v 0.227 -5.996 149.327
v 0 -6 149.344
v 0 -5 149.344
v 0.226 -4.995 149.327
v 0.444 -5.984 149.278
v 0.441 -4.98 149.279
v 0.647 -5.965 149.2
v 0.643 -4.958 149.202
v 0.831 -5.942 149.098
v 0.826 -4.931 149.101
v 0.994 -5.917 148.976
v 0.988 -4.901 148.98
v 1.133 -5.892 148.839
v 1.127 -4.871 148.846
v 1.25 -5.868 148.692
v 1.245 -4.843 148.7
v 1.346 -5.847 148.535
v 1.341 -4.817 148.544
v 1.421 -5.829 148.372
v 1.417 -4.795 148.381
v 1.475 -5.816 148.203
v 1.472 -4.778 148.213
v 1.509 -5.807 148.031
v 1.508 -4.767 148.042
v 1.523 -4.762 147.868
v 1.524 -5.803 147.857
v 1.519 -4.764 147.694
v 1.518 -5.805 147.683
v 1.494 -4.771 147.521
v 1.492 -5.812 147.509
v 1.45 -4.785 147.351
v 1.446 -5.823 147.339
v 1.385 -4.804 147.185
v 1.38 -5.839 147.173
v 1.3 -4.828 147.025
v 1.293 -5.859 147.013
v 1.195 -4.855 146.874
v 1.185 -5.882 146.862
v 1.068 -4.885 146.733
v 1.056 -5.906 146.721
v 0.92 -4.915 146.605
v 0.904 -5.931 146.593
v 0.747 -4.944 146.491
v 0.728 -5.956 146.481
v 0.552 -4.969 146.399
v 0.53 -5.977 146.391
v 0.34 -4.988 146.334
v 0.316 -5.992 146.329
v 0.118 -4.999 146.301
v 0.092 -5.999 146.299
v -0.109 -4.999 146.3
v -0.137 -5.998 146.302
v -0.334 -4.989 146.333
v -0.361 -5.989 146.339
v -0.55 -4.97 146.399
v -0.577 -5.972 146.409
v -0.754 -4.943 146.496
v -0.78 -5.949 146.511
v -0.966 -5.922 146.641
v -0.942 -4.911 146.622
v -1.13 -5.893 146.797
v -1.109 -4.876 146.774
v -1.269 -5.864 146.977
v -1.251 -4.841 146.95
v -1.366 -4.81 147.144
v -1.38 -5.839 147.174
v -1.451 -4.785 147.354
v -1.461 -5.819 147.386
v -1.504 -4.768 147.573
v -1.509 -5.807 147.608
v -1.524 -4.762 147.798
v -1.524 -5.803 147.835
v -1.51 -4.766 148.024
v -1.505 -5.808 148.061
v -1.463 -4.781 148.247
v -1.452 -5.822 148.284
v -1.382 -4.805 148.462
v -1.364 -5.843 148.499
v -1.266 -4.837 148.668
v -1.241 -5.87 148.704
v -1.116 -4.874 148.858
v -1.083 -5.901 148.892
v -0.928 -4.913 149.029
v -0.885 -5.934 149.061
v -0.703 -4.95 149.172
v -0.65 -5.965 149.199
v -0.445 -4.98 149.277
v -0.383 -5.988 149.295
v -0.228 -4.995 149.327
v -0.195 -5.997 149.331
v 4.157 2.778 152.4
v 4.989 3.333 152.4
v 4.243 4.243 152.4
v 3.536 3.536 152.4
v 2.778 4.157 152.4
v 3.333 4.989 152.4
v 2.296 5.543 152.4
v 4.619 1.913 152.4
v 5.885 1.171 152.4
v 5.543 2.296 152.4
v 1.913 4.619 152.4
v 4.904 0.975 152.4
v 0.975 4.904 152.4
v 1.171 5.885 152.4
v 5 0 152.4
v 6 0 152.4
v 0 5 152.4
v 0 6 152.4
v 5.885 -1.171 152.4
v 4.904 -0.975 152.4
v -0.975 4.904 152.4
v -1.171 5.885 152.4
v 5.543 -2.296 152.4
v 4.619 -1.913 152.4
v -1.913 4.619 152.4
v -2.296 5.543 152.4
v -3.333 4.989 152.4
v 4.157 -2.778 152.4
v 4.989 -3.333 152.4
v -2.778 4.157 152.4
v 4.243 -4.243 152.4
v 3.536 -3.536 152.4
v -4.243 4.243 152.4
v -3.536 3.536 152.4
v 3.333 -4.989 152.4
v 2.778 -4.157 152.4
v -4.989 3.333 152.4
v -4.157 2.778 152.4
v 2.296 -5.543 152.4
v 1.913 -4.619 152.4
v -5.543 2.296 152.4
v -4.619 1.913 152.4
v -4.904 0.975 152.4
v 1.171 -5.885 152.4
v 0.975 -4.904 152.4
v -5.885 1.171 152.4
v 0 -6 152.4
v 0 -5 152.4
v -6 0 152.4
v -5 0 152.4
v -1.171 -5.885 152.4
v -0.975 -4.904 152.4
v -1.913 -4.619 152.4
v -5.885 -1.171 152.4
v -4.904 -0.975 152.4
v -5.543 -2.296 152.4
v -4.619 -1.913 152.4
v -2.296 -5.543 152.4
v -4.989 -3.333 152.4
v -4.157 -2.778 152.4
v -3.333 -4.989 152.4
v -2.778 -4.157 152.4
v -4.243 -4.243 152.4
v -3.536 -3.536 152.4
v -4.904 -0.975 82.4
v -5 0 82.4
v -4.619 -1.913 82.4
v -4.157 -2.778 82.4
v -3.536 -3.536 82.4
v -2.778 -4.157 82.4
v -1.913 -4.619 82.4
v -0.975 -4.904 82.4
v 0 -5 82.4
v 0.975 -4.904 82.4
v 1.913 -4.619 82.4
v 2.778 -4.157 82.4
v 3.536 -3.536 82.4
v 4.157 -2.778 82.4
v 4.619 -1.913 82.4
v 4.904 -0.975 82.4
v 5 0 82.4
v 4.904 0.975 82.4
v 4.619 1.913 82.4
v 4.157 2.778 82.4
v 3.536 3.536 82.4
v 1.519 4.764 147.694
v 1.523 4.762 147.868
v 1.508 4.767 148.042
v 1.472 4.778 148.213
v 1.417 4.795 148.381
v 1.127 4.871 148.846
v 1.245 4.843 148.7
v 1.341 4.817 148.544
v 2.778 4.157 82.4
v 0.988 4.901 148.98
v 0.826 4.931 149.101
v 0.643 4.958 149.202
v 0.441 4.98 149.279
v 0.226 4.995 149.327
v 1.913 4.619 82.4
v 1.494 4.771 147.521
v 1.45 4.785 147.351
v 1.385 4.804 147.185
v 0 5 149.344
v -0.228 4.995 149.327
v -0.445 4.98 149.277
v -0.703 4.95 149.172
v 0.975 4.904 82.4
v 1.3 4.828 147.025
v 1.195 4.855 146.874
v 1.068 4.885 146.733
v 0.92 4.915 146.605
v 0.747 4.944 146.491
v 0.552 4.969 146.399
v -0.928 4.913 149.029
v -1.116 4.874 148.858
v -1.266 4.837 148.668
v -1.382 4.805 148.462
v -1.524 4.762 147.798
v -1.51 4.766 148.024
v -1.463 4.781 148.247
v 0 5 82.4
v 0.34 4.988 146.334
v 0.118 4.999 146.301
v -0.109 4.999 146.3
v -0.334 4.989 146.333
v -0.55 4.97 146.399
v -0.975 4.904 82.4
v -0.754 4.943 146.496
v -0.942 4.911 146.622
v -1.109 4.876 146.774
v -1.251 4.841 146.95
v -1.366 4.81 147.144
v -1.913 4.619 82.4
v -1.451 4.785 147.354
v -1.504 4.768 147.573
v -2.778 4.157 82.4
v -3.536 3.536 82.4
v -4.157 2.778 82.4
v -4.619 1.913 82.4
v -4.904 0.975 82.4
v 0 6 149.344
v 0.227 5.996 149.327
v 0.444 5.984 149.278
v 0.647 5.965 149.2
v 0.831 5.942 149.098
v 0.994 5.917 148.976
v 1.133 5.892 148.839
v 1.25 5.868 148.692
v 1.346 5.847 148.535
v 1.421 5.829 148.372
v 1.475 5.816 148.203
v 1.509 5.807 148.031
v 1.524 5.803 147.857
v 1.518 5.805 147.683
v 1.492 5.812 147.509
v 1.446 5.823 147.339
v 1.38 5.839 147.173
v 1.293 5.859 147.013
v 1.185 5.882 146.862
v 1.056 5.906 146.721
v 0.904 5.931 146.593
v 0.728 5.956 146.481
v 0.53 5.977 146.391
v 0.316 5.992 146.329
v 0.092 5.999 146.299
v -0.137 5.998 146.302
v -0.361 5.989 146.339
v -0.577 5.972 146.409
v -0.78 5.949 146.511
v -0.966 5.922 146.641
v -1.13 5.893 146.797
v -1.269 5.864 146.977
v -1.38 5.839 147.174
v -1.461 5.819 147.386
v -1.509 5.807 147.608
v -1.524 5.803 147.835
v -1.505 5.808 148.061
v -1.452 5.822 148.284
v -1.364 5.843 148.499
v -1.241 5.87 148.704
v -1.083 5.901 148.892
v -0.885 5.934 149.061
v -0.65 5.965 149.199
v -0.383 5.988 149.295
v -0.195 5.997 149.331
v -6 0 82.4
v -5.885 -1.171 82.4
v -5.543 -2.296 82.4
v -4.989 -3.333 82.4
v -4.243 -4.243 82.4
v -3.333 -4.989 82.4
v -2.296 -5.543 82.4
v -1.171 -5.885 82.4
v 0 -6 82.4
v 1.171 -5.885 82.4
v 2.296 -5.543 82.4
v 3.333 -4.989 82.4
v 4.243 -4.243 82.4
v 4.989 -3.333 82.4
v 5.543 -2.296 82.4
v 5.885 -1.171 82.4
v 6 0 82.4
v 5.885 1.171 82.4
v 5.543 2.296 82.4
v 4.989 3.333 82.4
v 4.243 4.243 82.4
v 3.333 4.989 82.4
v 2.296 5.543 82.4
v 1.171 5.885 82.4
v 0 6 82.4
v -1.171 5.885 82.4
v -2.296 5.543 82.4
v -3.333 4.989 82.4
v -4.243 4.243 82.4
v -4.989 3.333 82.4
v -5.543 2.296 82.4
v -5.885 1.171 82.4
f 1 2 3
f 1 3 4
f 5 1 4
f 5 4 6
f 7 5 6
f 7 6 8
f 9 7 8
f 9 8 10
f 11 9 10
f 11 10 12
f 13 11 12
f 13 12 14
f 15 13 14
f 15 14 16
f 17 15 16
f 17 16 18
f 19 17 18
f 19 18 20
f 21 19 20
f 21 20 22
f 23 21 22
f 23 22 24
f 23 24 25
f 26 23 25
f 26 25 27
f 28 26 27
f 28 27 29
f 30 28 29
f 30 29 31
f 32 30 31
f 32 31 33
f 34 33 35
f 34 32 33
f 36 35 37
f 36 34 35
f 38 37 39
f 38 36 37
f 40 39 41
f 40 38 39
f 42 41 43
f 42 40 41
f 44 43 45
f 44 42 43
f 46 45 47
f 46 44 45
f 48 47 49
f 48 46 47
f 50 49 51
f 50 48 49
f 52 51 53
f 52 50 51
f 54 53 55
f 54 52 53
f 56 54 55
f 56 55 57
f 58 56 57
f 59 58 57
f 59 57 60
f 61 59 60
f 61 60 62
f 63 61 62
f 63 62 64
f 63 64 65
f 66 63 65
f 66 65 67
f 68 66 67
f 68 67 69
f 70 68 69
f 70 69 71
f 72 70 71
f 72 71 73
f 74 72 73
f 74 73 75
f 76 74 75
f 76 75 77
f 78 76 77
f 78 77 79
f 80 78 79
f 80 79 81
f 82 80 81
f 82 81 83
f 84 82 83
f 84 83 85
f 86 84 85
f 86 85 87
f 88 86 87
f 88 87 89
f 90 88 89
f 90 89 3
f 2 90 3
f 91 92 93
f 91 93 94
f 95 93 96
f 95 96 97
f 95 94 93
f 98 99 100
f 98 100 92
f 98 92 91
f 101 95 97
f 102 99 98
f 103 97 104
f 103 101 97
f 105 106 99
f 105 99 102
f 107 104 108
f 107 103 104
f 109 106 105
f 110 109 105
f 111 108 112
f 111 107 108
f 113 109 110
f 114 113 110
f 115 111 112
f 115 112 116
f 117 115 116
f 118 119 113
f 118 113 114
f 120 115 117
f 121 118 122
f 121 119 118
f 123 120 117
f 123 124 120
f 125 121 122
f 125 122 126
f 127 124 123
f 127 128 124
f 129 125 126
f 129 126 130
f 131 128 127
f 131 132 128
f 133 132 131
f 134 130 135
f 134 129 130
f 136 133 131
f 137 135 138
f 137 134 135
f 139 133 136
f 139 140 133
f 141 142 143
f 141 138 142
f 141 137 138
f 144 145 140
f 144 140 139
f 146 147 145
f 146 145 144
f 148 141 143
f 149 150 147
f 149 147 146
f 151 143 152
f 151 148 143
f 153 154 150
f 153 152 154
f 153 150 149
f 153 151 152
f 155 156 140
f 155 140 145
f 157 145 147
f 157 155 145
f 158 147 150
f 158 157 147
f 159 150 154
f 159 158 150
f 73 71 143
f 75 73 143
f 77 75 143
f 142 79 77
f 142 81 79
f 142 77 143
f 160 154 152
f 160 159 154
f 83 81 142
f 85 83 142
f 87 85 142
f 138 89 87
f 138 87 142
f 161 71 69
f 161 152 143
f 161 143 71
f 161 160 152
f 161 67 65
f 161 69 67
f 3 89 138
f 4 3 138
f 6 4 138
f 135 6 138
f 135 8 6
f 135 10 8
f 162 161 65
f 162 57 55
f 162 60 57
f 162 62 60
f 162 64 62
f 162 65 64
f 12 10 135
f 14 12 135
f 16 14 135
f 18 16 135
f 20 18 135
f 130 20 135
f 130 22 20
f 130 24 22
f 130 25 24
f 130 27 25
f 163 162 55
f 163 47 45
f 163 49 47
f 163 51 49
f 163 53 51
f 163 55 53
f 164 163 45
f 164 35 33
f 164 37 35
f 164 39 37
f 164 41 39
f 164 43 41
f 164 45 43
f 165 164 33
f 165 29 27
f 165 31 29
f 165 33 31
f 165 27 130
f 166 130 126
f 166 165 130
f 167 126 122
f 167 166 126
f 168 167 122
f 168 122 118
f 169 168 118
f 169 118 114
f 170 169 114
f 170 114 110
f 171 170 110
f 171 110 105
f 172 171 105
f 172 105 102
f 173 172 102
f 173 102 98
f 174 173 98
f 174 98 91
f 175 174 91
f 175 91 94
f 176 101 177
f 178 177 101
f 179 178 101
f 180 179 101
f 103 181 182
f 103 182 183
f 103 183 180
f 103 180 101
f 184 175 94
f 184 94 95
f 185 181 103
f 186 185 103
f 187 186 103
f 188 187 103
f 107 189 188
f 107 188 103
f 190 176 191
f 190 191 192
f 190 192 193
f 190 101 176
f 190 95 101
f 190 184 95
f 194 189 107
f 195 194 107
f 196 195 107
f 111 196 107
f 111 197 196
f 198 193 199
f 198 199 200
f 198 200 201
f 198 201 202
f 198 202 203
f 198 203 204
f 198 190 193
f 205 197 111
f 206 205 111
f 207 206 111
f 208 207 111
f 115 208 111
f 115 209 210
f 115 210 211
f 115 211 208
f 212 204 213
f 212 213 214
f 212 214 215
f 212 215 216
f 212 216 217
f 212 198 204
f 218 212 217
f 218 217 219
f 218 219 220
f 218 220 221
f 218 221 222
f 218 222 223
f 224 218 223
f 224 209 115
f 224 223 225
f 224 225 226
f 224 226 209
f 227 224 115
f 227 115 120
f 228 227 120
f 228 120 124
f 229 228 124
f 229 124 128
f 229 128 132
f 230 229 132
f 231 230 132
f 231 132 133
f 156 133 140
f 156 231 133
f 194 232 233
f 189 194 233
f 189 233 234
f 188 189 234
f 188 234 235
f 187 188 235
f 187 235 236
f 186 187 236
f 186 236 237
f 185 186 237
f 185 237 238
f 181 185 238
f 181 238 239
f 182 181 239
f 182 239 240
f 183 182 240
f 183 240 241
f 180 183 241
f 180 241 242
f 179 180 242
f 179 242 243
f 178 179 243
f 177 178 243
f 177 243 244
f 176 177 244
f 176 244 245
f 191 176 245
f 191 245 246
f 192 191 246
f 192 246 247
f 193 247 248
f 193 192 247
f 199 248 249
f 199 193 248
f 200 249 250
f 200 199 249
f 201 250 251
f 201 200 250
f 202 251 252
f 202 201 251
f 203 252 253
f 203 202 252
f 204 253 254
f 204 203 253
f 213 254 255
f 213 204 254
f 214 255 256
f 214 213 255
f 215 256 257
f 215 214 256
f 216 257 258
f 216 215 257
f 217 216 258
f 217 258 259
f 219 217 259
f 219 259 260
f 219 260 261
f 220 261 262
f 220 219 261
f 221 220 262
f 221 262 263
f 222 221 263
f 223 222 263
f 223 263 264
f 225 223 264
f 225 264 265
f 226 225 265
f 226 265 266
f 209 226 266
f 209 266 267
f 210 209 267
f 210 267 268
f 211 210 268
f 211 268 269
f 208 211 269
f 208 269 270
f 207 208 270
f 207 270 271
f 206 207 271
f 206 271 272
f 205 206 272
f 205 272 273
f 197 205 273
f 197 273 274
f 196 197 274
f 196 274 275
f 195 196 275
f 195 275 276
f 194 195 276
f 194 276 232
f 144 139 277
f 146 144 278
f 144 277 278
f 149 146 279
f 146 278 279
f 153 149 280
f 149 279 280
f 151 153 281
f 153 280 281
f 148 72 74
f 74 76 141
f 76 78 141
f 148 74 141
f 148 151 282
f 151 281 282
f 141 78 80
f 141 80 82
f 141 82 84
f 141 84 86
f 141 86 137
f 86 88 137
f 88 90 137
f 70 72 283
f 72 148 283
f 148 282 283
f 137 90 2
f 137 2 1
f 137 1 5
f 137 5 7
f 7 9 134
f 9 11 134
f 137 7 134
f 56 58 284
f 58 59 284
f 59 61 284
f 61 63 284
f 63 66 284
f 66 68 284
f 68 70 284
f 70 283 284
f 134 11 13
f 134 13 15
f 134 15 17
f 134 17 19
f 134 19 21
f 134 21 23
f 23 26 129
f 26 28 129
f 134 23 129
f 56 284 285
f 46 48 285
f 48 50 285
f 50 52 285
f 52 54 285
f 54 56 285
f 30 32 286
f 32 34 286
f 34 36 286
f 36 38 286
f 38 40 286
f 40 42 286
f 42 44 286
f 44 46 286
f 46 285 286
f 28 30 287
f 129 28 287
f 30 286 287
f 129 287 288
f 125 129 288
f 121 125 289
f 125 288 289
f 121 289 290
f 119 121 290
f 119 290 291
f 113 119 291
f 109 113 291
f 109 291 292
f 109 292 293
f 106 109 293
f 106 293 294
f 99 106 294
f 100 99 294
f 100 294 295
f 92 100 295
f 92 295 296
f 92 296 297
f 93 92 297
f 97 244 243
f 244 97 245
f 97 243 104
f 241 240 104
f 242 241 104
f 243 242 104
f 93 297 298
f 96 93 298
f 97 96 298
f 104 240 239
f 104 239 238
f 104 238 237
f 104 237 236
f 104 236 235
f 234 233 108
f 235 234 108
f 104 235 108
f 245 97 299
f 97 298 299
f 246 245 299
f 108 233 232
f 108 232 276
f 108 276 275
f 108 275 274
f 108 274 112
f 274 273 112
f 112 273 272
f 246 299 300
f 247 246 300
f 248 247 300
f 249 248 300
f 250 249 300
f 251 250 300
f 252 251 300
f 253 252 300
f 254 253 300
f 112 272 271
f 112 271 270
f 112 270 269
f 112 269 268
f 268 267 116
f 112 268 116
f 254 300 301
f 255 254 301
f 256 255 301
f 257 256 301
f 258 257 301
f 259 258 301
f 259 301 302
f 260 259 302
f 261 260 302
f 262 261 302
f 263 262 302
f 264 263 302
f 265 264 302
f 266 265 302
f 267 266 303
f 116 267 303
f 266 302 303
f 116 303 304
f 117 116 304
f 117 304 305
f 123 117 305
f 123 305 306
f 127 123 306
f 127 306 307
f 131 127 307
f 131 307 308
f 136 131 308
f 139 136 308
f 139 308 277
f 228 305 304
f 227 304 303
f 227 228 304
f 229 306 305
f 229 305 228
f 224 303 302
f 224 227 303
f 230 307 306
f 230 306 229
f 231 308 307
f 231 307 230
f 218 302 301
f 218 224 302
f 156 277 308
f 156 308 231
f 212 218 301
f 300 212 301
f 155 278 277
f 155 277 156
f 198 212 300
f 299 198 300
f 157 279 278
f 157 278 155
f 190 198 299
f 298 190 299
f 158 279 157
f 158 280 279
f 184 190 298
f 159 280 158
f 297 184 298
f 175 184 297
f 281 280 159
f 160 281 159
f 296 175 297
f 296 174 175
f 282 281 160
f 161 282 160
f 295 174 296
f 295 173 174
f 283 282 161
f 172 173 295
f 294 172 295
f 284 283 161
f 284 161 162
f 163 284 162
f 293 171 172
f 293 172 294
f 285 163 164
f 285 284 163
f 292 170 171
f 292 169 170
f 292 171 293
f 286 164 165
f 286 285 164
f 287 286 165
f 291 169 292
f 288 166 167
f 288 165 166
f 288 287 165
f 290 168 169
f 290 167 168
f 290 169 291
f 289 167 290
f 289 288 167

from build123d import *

# Parameters (mm, degrees)
BOSS_EXTRUDE2_DEPTH      = 152.4
BOSS_EXTRUDE2_DEPTH_BACK = 152.4
SKETCH3_R                = 6
SKETCH3_R_2              = 5
CUT_EXTRUDE1_DEPTH       = 153.636037684
CUT_EXTRUDE1_DEPTH_BACK  = 153.636037684
SKETCH4_R                = 1.524
SKETCH5_R                = 6
CUT_EXTRUDE2_DEPTH       = 234.8


with BuildPart() as part:
    # Sketch3 → Boss-Extrude2 (new, two sides: drawn at the far end of the back side and taken through both)
    with BuildSketch(Plane.XY.offset(-BOSS_EXTRUDE2_DEPTH_BACK)):
        with Locations(Location((0, 0, 0), (0, 0, 180))):
            Circle(SKETCH3_R)
        with Locations(Location((0, 0, 0), (0, 0, 180))):
            Circle(SKETCH3_R_2, mode=Mode.SUBTRACT)
    extrude(amount=BOSS_EXTRUDE2_DEPTH + BOSS_EXTRUDE2_DEPTH_BACK)

    # Sketch4 → Cut-Extrude1 (cut, two sides: drawn at the far end of the back side and taken through both)
    with BuildSketch(Plane(origin=(0, 0, 0), x_dir=(1, 0, 0), z_dir=(0, 1, 0)).offset(-CUT_EXTRUDE1_DEPTH_BACK)):
        with Locations(Location((0, -147.82, 0), (0, 0, 270))):
            Circle(SKETCH4_R)
    extrude(amount=CUT_EXTRUDE1_DEPTH + CUT_EXTRUDE1_DEPTH_BACK, mode=Mode.SUBTRACT)

    # Sketch5 → Cut-Extrude2 (cut)
    with BuildSketch(Plane(origin=(0, 0, -152.4), x_dir=(-1, 0, 0), z_dir=(0, 0, -1))):
        with Locations(Location((0, 0, 0), (0, 0, 180))):
            Circle(SKETCH5_R)
    extrude(amount=-CUT_EXTRUDE2_DEPTH, mode=Mode.SUBTRACT)


solid = part.part
